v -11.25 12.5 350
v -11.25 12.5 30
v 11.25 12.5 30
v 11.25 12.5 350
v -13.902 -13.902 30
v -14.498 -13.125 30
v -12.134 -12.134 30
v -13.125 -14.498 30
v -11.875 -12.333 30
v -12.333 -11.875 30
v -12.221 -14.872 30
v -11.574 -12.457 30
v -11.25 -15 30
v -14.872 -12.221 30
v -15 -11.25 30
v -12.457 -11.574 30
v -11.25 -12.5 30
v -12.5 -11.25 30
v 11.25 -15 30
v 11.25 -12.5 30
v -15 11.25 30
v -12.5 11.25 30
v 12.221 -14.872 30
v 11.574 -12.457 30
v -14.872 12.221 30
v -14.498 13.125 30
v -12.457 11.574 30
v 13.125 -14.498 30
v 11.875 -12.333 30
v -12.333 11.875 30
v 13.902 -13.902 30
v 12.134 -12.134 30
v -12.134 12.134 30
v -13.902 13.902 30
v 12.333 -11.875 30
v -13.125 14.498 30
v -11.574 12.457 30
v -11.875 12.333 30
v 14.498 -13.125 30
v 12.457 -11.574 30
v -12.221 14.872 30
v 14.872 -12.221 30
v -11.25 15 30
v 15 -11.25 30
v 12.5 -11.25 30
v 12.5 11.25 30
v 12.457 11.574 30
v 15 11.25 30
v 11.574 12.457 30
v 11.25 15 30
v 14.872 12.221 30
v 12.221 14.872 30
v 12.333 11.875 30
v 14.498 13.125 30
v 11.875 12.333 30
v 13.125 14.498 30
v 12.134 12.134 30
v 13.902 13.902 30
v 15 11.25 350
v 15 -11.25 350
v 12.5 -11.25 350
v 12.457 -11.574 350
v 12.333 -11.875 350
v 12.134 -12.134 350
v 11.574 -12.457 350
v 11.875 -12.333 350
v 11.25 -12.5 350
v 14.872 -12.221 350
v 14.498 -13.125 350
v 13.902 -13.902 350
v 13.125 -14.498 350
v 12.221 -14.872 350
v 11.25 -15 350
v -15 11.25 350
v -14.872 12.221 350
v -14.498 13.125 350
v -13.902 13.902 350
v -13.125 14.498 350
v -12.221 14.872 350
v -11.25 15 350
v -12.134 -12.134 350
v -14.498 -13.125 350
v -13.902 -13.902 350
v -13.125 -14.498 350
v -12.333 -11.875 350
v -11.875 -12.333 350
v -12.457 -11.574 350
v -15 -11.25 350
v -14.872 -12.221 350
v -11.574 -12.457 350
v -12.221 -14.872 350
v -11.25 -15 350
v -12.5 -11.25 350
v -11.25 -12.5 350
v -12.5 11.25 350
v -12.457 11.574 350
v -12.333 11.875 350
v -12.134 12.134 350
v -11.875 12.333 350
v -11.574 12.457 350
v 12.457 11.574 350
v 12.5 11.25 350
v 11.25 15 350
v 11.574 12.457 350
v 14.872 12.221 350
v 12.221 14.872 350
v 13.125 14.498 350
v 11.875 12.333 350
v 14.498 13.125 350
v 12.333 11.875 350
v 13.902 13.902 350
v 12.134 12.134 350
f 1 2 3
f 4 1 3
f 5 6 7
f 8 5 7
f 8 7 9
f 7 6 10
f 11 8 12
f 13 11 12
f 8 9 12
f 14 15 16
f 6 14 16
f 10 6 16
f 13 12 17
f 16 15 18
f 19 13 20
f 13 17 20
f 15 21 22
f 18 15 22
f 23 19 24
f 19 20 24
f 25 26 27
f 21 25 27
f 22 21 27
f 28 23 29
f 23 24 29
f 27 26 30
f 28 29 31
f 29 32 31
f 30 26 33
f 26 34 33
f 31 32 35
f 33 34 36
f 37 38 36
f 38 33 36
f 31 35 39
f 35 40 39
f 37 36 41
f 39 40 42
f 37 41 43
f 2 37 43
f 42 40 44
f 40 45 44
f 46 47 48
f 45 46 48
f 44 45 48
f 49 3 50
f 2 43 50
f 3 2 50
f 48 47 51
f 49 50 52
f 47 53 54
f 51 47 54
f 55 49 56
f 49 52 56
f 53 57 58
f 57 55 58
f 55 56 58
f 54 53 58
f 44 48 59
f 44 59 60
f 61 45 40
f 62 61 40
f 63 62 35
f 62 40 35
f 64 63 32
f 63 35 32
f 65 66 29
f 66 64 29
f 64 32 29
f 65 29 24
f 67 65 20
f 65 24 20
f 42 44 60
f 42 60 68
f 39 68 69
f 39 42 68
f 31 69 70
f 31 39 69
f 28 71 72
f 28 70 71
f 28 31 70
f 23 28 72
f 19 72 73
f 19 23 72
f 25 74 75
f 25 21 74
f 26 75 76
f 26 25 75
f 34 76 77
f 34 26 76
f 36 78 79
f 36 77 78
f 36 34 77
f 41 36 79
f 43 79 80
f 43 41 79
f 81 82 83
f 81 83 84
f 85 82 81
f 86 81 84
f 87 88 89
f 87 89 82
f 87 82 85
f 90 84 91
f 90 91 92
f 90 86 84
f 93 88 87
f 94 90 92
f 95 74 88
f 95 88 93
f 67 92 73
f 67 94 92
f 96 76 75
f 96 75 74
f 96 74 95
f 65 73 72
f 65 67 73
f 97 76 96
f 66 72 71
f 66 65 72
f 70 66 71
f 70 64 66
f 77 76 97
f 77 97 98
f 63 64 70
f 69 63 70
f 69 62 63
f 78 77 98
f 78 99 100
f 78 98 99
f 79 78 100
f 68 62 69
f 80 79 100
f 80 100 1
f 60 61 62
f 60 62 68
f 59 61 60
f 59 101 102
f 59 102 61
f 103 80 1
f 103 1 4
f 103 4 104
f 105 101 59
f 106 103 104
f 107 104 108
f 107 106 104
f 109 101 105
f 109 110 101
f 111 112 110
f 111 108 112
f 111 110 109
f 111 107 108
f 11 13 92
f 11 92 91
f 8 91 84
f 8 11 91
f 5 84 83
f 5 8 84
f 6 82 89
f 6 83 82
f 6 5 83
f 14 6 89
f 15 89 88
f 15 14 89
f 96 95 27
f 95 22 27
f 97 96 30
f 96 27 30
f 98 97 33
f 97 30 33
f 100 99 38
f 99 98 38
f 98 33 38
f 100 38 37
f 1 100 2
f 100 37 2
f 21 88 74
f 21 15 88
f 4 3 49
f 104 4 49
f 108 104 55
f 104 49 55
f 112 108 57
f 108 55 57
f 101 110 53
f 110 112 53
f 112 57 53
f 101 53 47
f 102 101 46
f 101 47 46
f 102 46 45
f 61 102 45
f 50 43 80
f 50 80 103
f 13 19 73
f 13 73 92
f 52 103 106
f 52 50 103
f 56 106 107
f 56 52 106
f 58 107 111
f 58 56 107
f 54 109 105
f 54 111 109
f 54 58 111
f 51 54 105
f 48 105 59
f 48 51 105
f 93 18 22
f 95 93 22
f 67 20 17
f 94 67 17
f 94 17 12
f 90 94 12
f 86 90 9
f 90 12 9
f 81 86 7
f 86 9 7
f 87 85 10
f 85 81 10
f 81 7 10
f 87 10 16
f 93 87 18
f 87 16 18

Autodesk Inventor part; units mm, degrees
ref_plane "Start plane" through (0, 0, 30) normal (0, 0, 1) x (1, 0, 0)
ref_plane "End plane" through (0, 0, 350) normal (0, 0, 1) x (1, 0, 0)
sketch "Sketch" plane through (0, 0, 0) normal (0, 0, 1) x (1, 0, 0)
  line L0 (-15, -11.25) -> (-15, 11.25)
  line L1 (-11.25, 15) -> (11.25, 15)
  line L2 (15, 11.25) -> (15, -11.25)
  line L3 (11.25, -15) -> (-11.25, -15)
  arc A0 (-15, -11.25) -> (-11.25, -15) centre (-11.25, -11.25) ccw
  arc A1 (-11.25, 15) -> (-15, 11.25) centre (-11.25, 11.25) ccw
  arc A2 (15, 11.25) -> (11.25, 15) centre (11.25, 11.25) ccw
  arc A3 (11.25, -15) -> (15, -11.25) centre (11.25, -11.25) ccw
  arc A4 (-11.25, 12.5) -> (-12.5, 11.25) centre (-11.25, 11.25) ccw
  line L4 (-11.25, 12.5) -> (11.25, 12.5)
  arc A5 (12.5, 11.25) -> (11.25, 12.5) centre (11.25, 11.25) ccw
  line L5 (12.5, 11.25) -> (12.5, -11.25)
  arc A6 (11.25, -12.5) -> (12.5, -11.25) centre (11.25, -11.25) ccw
  line L6 (11.25, -12.5) -> (-11.25, -12.5)
  arc A7 (-12.5, -11.25) -> (-11.25, -12.5) centre (-11.25, -11.25) ccw
  line L7 (-12.5, -11.25) -> (-12.5, 11.25)
  line L8 (0, 22.0873) -> (0, -22.0873) construction
  line L9 (-22.0873, 0) -> (22.0873, 0) construction
  dimension "d7" = 3.75
  dimension "d10" = 30
  dimension "d11" = 30
  dimension "d12" = 2.5
  dimension "d15" = 15
  dimension "d16" = 15
extrude "Body" add sketch "Sketch" along normal up to surface (320 mm away) from surface at 30
sketch "Sketch3" plane through (0, 0, 0) normal (0, 0, 1) x (1, 0, 0)
  line L0 (0, 0) -> (10, 0)
ref_plane "Work Plane3" through (0, 0, 0) normal (0, -1, 0) x (1, 0, 0)
sketch "Sketch4" plane through (0, 0, 0) normal (0, -1, 0) x (1, 0, 0)
  line L0 (-2, 30) -> (12, 30)
  line L1 (-2, 350) -> (12, 350)
  dimension "d18" = 320
ref_plane "Work Plane4" through (599.2, 515, 350) normal (0, 0, 1) x (1, 0, 0)
split "Split1" plane through (599.2, 515, 350) removes the side toward (0, 0, 1)
ref_plane "Work Plane5" through (-15, -11.25, 30) normal (0, 0, -1) x (-1, 0, 0)
split "Split2" plane through (-15, -11.25, 30) removes the side toward (0, 0, -1)
equation "\"d7\" = G_IR"
equation "\"d10\" = G_H"
equation "\"d11\" = G_W"
equation "\"d12\" = G_T"
equation "\"d15\" = 0.5 * d10"
equation "\"d16\" = 0.5 * d11"
equation "\"d3\" = G_L"
equation "\"G_W\" = 30"
equation "\"G_H\" = 30"
equation "\"G_T\" = 2.5"
equation "\"G_IR\" = 3.75"
equation "\"G_L\" = d18"
properties part number "DIN EN 10305-5 - 30 x 30 x 2,5  - 320" material "Steel, Mild"
